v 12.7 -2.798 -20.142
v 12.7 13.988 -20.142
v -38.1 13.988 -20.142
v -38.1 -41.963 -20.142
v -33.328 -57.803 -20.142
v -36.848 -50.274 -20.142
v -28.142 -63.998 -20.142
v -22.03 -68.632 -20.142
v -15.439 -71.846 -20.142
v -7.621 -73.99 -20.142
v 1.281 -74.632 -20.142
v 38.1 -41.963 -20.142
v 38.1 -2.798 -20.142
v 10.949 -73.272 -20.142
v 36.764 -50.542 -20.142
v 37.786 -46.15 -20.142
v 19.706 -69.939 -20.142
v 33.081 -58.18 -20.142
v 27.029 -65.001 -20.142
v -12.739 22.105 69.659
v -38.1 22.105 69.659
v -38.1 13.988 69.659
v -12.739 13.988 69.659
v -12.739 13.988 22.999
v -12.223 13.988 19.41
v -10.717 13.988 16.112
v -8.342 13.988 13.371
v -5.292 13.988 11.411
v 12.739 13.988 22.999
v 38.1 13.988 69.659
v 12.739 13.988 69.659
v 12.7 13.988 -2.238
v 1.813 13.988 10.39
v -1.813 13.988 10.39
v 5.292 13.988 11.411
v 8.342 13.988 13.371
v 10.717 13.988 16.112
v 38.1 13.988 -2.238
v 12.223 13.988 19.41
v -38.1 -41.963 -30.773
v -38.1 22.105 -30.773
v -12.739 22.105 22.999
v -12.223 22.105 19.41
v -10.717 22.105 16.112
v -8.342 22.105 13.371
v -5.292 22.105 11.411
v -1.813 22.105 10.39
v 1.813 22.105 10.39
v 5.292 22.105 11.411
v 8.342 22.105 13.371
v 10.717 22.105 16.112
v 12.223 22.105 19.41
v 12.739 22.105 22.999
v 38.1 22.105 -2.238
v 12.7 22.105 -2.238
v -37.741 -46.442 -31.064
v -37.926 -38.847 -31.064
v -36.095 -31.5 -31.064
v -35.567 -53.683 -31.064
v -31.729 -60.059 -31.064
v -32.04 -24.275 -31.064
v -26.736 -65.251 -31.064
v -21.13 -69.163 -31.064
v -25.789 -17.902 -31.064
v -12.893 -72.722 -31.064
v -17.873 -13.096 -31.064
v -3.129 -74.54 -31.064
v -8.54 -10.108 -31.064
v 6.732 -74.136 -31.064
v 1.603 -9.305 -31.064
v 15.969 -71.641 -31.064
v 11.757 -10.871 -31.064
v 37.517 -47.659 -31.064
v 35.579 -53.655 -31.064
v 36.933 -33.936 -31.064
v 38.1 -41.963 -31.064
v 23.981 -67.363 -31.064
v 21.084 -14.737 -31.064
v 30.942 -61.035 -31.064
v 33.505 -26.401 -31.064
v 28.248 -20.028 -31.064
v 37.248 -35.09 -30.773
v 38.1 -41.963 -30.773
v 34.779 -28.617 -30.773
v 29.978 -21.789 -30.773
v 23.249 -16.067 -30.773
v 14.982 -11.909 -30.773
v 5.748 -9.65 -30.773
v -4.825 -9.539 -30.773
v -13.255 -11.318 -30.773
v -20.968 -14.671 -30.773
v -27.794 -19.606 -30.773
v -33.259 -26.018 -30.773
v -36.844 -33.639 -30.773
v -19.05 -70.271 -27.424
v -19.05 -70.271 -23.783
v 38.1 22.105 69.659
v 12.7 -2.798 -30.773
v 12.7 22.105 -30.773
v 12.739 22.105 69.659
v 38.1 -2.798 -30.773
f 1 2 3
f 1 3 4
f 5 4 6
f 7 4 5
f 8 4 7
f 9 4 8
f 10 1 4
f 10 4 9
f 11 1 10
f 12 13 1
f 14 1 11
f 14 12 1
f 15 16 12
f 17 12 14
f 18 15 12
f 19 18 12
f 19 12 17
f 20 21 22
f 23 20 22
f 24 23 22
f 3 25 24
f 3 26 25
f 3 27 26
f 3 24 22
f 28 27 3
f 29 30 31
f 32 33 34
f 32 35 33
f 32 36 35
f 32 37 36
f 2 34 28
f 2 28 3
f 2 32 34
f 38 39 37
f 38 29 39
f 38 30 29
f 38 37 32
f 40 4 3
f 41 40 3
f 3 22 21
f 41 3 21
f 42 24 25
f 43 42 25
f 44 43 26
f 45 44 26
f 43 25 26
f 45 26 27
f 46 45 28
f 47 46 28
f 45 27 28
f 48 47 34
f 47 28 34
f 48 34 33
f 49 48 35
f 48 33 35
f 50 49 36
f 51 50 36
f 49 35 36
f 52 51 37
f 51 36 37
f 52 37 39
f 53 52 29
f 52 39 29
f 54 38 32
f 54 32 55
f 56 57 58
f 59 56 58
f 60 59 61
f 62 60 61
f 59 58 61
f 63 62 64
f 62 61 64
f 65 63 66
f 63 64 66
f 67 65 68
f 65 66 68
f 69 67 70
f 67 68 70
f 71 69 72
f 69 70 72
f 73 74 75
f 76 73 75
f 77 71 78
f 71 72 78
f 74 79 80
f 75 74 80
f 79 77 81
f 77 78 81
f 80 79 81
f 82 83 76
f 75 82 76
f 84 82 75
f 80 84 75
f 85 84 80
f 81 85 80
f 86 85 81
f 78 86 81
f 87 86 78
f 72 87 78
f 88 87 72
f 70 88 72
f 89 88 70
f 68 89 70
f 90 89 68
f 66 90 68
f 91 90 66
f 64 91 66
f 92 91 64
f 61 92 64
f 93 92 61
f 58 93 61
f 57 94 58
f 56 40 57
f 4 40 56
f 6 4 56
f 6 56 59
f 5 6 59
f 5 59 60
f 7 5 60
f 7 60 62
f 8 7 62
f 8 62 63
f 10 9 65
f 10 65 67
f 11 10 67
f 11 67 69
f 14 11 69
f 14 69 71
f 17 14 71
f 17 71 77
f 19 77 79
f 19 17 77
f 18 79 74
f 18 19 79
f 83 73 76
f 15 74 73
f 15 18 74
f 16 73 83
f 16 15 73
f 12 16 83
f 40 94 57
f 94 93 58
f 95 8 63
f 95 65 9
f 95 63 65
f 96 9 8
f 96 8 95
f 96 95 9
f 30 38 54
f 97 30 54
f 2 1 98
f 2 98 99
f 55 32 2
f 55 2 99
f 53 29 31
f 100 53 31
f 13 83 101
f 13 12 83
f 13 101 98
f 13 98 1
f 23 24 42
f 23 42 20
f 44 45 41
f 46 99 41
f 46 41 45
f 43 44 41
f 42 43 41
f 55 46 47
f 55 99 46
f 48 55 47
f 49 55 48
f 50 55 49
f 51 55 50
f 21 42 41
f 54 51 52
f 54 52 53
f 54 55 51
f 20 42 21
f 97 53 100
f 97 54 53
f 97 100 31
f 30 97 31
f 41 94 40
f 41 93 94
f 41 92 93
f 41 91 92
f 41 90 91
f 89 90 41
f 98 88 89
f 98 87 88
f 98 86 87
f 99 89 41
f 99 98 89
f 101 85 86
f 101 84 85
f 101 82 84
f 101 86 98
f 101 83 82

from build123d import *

# Parameters (mm, degrees)
F1_DEPTH = 38.1
F2_W     = 25.4778154194
F2_H     = 46.6601713864
F3_DEPTH = 25.4
F4_R     = 12.7389077097
F5_DEPTH = 25.4
F7_DEPTH = 10.922
F8_W     = 31.6123468801
F8_H     = 31.3325910829
F9_DEPTH = 25.4


with BuildPart() as f1:
    # F0 (on Right) → F1 (new body, symmetric)
    with BuildSketch(Plane.YZ):
        Polygon((22.1054865791, -30.7730790228), (22.1054865791, 69.6590542793), (13.9877619222, 69.6590542793), (13.9877619222, -20.1423782855), (-41.9632866979, -20.1423782855), (-41.9632866979, -30.7730790228), align=None)
    extrude(amount=F1_DEPTH, both=True)

    # F2 (on face) → F3 (cut)
    with BuildSketch(Plane.XZ.offset(-13.9877619222)):
        with Locations((0, 46.3289685861)):
            Rectangle(F2_W, F2_H)
    extrude(amount=-F3_DEPTH, mode=Mode.SUBTRACT)

    # F4 (on face) → F5 (cut)
    with BuildSketch(Plane.XZ.offset(-13.9877619222)):
        with Locations((0, 22.9988828929)):
            Circle(F4_R)
    extrude(amount=-F5_DEPTH, mode=Mode.SUBTRACT)

    # F6 (on face) → F7 (join)
    with BuildSketch(Plane.XY.offset(-20.1423782855)):
        with BuildLine():
            add(Edge.make_bspline(
                [(38.1, -41.9632866979), (38.1, 14.6527967771), (-19.05, -13.6552449604), (-76.2, -41.9632866979), (-19.05, -70.2713284353), (38.1, -98.5793701728), (38.1, -41.9632866979)],
                knots=[0, 0, 0, 2.0943951024, 2.0943951024, 4.1887902048, 4.1887902048, 6.2831853072, 6.2831853072, 6.2831853072], degree=2, weights=[1, 0.5, 1, 0.5, 1, 0.5, 1]))
        make_face()
    extrude(amount=-F7_DEPTH)

    # F8 (on face) → F9 (cut)
    with BuildSketch(Plane.YZ.offset(38.1)):
        with Locations((13.008619193, -17.9043367971)):
            Rectangle(F8_W, F8_H)
    extrude(amount=-F9_DEPTH, mode=Mode.SUBTRACT)


solid = f1.part
